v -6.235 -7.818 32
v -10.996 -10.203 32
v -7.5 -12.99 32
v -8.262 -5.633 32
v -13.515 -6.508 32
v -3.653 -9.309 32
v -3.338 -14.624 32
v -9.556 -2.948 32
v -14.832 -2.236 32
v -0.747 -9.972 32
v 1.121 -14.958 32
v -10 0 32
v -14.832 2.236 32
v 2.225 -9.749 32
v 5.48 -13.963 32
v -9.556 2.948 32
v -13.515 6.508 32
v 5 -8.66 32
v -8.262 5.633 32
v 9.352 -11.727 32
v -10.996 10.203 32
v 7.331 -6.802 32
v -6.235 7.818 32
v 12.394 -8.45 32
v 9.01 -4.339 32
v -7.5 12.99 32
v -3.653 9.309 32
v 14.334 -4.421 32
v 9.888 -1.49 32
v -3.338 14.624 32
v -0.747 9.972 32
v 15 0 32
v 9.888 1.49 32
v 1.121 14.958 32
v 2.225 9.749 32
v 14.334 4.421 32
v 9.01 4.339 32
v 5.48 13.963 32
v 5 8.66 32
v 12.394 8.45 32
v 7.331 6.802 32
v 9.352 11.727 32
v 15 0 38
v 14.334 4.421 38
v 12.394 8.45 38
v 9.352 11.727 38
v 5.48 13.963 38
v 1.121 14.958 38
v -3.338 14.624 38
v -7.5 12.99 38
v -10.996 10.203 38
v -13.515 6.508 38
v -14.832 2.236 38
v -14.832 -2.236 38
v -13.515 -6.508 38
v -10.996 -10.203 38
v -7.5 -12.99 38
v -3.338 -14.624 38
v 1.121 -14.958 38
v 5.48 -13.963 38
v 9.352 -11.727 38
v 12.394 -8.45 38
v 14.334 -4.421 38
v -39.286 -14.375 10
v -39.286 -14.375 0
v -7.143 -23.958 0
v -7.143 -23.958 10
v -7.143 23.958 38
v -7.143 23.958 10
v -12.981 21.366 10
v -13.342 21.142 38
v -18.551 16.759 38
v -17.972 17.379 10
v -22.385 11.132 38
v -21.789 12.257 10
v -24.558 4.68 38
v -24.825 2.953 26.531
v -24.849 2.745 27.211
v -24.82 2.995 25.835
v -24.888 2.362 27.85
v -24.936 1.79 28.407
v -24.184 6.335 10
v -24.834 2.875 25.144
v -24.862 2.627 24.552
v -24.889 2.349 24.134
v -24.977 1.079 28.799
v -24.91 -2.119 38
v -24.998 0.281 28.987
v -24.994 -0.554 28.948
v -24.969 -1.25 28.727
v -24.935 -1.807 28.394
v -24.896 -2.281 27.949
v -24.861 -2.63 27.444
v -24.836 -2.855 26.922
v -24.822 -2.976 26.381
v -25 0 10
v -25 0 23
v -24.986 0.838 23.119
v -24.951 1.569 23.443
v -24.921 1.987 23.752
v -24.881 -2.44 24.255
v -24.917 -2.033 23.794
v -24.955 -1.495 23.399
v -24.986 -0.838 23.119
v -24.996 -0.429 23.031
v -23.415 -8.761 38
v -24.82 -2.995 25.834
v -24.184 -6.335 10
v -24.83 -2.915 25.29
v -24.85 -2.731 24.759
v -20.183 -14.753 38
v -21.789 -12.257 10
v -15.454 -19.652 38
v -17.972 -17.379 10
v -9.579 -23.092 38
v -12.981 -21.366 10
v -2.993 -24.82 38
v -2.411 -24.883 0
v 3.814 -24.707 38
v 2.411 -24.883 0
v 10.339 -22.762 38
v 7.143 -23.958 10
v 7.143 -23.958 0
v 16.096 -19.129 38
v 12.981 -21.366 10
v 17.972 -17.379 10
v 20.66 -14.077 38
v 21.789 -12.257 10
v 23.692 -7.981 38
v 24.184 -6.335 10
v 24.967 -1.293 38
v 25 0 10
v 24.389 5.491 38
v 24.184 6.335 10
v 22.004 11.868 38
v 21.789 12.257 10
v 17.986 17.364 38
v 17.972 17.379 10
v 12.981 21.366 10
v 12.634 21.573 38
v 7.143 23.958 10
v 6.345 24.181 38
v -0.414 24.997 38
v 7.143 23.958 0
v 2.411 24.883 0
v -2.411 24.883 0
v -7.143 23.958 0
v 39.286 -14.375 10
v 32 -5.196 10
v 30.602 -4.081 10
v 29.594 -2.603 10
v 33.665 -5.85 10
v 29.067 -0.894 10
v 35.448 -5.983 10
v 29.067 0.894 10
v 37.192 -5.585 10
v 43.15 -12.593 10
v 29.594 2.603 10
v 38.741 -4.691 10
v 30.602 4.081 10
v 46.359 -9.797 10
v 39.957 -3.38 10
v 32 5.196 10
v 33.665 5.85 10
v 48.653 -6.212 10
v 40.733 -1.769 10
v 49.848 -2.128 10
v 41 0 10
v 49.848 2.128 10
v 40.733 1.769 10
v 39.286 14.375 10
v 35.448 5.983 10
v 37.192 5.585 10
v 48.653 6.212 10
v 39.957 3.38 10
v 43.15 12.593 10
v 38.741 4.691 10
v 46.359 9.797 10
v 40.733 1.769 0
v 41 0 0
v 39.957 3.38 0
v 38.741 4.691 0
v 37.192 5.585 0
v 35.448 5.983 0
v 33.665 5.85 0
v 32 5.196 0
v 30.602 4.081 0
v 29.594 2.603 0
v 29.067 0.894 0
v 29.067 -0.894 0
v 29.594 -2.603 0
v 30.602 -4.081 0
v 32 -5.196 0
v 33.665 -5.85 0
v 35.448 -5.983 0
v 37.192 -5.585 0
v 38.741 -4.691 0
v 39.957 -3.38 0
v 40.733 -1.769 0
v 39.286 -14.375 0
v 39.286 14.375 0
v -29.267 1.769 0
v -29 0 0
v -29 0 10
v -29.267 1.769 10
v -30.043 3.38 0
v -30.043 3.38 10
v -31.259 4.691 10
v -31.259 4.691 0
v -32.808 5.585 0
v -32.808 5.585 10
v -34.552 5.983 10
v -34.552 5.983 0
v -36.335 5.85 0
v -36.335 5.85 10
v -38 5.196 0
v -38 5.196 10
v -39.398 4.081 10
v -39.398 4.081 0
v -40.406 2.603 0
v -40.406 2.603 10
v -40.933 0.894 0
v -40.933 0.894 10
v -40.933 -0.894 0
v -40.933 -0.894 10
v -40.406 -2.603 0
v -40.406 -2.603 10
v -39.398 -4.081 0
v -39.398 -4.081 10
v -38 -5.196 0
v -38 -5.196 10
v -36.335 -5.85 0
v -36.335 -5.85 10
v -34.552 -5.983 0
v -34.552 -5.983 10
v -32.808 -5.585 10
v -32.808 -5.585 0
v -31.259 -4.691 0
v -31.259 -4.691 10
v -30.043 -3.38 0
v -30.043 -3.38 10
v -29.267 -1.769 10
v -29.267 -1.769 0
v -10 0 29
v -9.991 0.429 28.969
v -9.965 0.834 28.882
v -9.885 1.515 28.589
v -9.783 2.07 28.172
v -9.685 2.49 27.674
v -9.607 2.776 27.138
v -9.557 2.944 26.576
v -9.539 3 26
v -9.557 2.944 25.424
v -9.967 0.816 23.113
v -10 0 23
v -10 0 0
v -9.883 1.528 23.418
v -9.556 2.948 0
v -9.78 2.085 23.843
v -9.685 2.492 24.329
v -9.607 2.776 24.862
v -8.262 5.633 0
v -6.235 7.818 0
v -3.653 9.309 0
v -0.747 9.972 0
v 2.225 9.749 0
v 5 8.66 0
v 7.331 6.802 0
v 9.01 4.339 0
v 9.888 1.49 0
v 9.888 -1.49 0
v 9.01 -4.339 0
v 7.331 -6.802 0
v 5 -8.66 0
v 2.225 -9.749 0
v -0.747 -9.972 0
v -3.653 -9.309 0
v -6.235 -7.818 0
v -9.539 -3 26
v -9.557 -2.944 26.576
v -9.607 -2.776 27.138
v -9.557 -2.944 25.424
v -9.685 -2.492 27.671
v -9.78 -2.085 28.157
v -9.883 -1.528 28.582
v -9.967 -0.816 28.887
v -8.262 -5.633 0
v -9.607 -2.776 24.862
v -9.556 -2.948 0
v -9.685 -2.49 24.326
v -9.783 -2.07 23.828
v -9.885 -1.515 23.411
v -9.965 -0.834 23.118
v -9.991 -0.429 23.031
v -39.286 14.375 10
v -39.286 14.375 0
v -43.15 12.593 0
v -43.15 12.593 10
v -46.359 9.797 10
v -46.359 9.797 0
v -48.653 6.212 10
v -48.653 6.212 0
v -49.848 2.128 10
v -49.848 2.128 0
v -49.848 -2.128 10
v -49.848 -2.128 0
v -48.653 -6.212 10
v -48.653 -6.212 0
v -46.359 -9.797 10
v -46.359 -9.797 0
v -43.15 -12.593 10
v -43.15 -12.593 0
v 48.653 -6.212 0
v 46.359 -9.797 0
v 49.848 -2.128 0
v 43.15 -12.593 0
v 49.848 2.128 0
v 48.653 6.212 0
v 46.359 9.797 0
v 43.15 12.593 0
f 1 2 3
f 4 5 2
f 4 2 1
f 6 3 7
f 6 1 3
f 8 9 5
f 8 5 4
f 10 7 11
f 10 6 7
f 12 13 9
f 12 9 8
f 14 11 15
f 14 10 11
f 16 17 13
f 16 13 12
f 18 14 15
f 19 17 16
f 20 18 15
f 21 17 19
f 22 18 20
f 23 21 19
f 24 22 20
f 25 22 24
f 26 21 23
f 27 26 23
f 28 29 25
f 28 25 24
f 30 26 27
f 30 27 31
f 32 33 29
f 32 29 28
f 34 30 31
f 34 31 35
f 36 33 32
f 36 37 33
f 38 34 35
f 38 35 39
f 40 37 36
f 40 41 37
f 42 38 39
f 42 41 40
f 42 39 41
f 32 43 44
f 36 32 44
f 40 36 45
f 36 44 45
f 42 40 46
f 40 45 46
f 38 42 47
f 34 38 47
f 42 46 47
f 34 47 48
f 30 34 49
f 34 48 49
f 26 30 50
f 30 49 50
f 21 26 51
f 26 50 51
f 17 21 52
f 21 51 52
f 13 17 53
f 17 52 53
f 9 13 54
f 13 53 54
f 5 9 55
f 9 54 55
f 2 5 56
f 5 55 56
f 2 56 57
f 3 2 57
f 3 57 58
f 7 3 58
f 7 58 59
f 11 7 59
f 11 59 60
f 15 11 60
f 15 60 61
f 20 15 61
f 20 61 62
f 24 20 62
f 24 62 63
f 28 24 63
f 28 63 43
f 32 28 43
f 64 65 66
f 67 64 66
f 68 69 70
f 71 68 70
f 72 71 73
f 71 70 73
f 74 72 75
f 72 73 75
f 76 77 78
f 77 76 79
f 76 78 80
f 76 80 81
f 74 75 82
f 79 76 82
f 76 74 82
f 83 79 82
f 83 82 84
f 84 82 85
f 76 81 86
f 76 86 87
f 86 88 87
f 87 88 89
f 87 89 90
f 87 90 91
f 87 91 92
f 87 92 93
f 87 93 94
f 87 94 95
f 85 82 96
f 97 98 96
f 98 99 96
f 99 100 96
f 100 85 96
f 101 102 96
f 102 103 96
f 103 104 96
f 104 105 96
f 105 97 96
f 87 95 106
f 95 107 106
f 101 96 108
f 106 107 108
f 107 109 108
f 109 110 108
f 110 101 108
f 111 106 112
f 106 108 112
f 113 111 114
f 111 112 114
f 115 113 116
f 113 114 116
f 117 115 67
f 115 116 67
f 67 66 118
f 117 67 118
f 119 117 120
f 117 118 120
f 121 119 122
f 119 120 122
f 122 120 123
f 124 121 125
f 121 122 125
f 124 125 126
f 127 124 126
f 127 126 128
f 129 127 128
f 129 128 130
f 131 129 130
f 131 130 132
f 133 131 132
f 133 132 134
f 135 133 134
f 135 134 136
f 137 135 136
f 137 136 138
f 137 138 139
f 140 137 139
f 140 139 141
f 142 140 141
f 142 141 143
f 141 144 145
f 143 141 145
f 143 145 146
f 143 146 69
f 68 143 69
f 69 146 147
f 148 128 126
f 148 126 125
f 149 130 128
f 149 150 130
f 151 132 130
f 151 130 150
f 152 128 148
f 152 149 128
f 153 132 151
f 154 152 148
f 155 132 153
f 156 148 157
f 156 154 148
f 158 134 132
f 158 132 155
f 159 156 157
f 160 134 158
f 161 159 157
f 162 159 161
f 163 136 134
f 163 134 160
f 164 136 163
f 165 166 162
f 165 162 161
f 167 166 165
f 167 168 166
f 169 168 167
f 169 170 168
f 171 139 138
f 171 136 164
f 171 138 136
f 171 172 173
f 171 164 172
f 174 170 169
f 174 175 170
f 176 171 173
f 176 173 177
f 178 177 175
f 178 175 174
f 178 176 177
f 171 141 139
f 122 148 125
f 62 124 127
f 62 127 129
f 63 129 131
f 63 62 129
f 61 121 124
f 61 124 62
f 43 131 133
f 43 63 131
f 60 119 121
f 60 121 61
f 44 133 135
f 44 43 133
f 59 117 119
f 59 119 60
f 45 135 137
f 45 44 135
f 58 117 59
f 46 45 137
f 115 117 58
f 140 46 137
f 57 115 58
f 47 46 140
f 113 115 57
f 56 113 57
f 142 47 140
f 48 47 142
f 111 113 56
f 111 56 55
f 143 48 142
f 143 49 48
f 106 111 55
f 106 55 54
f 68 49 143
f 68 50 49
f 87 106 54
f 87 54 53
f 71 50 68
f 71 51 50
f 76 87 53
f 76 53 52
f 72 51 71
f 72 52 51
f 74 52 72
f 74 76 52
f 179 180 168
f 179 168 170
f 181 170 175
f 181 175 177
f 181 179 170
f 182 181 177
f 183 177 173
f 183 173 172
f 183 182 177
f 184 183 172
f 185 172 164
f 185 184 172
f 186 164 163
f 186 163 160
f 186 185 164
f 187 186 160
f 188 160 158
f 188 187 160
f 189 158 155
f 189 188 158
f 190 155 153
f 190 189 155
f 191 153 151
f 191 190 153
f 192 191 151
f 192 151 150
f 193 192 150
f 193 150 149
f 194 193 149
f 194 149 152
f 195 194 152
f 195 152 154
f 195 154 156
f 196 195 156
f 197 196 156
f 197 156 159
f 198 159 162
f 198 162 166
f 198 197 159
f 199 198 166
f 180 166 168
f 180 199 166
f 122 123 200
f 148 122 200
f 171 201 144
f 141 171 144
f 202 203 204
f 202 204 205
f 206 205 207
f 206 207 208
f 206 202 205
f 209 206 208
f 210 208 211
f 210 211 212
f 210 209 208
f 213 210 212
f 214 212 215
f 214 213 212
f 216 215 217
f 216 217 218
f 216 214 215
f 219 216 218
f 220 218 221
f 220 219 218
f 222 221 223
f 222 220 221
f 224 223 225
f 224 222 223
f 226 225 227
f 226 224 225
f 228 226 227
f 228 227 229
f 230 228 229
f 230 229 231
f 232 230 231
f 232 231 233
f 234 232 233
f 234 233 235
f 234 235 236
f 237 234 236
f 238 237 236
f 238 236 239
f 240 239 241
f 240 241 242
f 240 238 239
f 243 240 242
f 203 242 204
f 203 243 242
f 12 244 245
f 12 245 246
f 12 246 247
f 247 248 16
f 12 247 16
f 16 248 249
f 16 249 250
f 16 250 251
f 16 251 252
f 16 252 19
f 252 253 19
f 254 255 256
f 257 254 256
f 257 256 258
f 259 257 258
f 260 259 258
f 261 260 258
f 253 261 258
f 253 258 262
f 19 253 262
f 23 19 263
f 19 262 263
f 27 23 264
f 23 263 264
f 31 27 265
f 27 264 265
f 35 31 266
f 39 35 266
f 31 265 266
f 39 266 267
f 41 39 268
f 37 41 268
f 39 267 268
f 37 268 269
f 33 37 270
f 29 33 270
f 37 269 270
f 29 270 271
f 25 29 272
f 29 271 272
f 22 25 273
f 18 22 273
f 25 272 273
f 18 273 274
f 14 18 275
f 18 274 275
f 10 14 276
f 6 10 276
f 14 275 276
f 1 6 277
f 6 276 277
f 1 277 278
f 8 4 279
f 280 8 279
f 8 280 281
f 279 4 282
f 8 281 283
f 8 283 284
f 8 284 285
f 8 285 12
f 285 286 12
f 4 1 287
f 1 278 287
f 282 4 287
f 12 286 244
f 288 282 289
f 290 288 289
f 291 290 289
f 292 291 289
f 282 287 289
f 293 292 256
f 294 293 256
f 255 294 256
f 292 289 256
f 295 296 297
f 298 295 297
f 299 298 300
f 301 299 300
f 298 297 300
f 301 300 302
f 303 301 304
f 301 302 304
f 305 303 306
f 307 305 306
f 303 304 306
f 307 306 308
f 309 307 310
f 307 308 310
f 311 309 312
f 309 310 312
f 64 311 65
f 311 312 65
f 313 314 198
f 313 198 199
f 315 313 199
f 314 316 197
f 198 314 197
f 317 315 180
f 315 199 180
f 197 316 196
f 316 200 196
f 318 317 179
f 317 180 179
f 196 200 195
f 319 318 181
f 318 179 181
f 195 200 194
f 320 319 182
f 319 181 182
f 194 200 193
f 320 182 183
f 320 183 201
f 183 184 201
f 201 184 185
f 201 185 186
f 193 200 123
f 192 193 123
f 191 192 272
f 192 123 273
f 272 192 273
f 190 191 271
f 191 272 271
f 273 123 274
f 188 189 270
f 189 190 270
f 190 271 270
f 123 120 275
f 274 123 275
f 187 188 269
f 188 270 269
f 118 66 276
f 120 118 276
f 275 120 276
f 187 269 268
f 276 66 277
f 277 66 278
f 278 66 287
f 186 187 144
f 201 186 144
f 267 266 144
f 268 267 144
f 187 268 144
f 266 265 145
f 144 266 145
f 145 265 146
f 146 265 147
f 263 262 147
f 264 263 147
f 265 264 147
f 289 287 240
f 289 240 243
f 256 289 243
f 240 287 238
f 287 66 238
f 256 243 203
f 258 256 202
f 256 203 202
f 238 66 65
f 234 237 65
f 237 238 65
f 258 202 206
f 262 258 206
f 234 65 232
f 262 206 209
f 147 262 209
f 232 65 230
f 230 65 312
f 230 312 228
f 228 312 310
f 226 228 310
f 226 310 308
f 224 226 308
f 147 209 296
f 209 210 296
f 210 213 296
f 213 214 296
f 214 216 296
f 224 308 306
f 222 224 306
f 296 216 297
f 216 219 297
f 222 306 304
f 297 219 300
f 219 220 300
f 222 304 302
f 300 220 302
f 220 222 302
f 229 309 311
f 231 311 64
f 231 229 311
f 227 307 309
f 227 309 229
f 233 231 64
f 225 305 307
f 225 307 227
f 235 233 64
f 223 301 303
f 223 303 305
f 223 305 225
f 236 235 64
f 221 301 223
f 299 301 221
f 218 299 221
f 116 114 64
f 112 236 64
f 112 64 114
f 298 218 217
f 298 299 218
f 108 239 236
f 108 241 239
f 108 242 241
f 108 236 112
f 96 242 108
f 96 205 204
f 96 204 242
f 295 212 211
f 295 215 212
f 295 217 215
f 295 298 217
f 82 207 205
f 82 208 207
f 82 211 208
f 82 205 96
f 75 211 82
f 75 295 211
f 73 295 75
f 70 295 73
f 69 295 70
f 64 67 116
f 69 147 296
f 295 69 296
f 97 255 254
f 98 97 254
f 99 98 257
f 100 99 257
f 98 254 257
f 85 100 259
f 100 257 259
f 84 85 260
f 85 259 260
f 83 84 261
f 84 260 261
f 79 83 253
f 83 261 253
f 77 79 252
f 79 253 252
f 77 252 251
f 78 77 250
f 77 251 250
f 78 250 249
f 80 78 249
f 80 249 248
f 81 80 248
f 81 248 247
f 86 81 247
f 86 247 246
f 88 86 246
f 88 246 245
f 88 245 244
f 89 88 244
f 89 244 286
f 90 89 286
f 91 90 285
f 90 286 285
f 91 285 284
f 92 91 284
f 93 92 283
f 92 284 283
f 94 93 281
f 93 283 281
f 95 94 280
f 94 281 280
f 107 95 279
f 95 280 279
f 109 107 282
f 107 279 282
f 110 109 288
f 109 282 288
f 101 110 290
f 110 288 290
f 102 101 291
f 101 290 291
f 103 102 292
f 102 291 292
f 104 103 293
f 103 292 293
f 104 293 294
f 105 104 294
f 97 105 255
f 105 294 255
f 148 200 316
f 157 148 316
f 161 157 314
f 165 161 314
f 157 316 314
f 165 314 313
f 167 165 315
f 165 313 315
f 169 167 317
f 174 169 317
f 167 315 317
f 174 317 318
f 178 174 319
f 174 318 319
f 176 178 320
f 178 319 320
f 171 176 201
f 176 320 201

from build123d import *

# Parameters (mm, degrees)
SKETCH1_R                                 = 6
BOSS_EXTRUDE1_DEPTH                       = 10
BOSS_EXTRUDE1_2_DEPTH                     = 10
BOSS_EXTRUDE2_DEPTH                       = 38
CBORE_FOR_M12_HEX_HEAD_SCREW1_D           = 20
CBORE_FOR_M12_HEX_HEAD_SCREW1_CBORE_D     = 30
CBORE_FOR_M12_HEX_HEAD_SCREW1_CBORE_DEPTH = 6
SKETCH6_R                                 = 3
CUT_EXTRUDE1_DEPTH                        = 38


with BuildPart() as part:
    # Sketch1 → Boss-Extrude1 (new body)
    with BuildSketch(Plane.XY):
        with BuildLine():
            Line((-7.142857143, 23.957871187), (-39.285714286, 14.374722712))
            ThreePointArc((-39.285714286, 14.374722712), (-50, 0), (-39.285714286, -14.374722712))
            Line((-39.285714286, -14.374722712), (-7.142857143, -23.957871187))
            ThreePointArc((-7.142857143, -23.957871187), (-25, 0), (-7.142857143, 23.957871187))
        make_face()
        with Locations((-35, 0)):
            Circle(SKETCH1_R, mode=Mode.SUBTRACT)
    extrude(amount=BOSS_EXTRUDE1_DEPTH)



with BuildPart() as body_2:
    # Sketch1 → Boss-Extrude1 2 (new body)
    with BuildSketch(Plane.XY):
        with BuildLine():
            Line((39.285714286, 14.374722712), (7.142857143, 23.957871187))
            ThreePointArc((7.142857143, 23.957871187), (25, 0), (7.142857143, -23.957871187))
            Line((7.142857143, -23.957871187), (39.285714286, -14.374722712))
            ThreePointArc((39.285714286, -14.374722712), (50, 0), (39.285714286, 14.374722712))
        make_face()
        with Locations((35, 0)):
            Circle(SKETCH1_R, mode=Mode.SUBTRACT)
    extrude(amount=BOSS_EXTRUDE1_2_DEPTH)


with BuildPart() as part_1:
    add(part.part)

    add(body_2.part)  # Boss-Extrude2 merges body 2
    # Sketch1<3> → Boss-Extrude2 (add)
    with BuildSketch(Plane.XY):
        with BuildLine():
            ThreePointArc((7.142857143, 23.957871187), (0, 25), (-7.142857143, 23.957871187))
            ThreePointArc((-7.142857143, 23.957871187), (-25, 0), (-7.142857143, -23.957871187))
            ThreePointArc((-7.142857143, -23.957871187), (0, -25), (7.142857143, -23.957871187))
            ThreePointArc((7.142857143, -23.957871187), (20.044593143, -14.940357617), (25, 0))
            ThreePointArc((25, 0), (20.044593143, 14.940357617), (7.142857143, 23.957871187))
        make_face()
    extrude(amount=BOSS_EXTRUDE2_DEPTH)

    # CBORE for M12 Hex Head Screw1 (through all)
    with Locations(Plane.XY.offset(38)):
        with Locations((0, 0)):
            CounterBoreHole(CBORE_FOR_M12_HEX_HEAD_SCREW1_D / 2, CBORE_FOR_M12_HEX_HEAD_SCREW1_CBORE_D / 2, CBORE_FOR_M12_HEX_HEAD_SCREW1_CBORE_DEPTH)

    # Sketch6 → Cut-Extrude1 (cut)
    with BuildSketch(Plane(origin=(0, 0, 0), x_dir=(0, 0, -1), z_dir=(1, 0, 0))):
        with Locations((-26, 0)):
            Circle(SKETCH6_R)
    extrude(amount=-CUT_EXTRUDE1_DEPTH, mode=Mode.SUBTRACT)


solid = part_1.part
